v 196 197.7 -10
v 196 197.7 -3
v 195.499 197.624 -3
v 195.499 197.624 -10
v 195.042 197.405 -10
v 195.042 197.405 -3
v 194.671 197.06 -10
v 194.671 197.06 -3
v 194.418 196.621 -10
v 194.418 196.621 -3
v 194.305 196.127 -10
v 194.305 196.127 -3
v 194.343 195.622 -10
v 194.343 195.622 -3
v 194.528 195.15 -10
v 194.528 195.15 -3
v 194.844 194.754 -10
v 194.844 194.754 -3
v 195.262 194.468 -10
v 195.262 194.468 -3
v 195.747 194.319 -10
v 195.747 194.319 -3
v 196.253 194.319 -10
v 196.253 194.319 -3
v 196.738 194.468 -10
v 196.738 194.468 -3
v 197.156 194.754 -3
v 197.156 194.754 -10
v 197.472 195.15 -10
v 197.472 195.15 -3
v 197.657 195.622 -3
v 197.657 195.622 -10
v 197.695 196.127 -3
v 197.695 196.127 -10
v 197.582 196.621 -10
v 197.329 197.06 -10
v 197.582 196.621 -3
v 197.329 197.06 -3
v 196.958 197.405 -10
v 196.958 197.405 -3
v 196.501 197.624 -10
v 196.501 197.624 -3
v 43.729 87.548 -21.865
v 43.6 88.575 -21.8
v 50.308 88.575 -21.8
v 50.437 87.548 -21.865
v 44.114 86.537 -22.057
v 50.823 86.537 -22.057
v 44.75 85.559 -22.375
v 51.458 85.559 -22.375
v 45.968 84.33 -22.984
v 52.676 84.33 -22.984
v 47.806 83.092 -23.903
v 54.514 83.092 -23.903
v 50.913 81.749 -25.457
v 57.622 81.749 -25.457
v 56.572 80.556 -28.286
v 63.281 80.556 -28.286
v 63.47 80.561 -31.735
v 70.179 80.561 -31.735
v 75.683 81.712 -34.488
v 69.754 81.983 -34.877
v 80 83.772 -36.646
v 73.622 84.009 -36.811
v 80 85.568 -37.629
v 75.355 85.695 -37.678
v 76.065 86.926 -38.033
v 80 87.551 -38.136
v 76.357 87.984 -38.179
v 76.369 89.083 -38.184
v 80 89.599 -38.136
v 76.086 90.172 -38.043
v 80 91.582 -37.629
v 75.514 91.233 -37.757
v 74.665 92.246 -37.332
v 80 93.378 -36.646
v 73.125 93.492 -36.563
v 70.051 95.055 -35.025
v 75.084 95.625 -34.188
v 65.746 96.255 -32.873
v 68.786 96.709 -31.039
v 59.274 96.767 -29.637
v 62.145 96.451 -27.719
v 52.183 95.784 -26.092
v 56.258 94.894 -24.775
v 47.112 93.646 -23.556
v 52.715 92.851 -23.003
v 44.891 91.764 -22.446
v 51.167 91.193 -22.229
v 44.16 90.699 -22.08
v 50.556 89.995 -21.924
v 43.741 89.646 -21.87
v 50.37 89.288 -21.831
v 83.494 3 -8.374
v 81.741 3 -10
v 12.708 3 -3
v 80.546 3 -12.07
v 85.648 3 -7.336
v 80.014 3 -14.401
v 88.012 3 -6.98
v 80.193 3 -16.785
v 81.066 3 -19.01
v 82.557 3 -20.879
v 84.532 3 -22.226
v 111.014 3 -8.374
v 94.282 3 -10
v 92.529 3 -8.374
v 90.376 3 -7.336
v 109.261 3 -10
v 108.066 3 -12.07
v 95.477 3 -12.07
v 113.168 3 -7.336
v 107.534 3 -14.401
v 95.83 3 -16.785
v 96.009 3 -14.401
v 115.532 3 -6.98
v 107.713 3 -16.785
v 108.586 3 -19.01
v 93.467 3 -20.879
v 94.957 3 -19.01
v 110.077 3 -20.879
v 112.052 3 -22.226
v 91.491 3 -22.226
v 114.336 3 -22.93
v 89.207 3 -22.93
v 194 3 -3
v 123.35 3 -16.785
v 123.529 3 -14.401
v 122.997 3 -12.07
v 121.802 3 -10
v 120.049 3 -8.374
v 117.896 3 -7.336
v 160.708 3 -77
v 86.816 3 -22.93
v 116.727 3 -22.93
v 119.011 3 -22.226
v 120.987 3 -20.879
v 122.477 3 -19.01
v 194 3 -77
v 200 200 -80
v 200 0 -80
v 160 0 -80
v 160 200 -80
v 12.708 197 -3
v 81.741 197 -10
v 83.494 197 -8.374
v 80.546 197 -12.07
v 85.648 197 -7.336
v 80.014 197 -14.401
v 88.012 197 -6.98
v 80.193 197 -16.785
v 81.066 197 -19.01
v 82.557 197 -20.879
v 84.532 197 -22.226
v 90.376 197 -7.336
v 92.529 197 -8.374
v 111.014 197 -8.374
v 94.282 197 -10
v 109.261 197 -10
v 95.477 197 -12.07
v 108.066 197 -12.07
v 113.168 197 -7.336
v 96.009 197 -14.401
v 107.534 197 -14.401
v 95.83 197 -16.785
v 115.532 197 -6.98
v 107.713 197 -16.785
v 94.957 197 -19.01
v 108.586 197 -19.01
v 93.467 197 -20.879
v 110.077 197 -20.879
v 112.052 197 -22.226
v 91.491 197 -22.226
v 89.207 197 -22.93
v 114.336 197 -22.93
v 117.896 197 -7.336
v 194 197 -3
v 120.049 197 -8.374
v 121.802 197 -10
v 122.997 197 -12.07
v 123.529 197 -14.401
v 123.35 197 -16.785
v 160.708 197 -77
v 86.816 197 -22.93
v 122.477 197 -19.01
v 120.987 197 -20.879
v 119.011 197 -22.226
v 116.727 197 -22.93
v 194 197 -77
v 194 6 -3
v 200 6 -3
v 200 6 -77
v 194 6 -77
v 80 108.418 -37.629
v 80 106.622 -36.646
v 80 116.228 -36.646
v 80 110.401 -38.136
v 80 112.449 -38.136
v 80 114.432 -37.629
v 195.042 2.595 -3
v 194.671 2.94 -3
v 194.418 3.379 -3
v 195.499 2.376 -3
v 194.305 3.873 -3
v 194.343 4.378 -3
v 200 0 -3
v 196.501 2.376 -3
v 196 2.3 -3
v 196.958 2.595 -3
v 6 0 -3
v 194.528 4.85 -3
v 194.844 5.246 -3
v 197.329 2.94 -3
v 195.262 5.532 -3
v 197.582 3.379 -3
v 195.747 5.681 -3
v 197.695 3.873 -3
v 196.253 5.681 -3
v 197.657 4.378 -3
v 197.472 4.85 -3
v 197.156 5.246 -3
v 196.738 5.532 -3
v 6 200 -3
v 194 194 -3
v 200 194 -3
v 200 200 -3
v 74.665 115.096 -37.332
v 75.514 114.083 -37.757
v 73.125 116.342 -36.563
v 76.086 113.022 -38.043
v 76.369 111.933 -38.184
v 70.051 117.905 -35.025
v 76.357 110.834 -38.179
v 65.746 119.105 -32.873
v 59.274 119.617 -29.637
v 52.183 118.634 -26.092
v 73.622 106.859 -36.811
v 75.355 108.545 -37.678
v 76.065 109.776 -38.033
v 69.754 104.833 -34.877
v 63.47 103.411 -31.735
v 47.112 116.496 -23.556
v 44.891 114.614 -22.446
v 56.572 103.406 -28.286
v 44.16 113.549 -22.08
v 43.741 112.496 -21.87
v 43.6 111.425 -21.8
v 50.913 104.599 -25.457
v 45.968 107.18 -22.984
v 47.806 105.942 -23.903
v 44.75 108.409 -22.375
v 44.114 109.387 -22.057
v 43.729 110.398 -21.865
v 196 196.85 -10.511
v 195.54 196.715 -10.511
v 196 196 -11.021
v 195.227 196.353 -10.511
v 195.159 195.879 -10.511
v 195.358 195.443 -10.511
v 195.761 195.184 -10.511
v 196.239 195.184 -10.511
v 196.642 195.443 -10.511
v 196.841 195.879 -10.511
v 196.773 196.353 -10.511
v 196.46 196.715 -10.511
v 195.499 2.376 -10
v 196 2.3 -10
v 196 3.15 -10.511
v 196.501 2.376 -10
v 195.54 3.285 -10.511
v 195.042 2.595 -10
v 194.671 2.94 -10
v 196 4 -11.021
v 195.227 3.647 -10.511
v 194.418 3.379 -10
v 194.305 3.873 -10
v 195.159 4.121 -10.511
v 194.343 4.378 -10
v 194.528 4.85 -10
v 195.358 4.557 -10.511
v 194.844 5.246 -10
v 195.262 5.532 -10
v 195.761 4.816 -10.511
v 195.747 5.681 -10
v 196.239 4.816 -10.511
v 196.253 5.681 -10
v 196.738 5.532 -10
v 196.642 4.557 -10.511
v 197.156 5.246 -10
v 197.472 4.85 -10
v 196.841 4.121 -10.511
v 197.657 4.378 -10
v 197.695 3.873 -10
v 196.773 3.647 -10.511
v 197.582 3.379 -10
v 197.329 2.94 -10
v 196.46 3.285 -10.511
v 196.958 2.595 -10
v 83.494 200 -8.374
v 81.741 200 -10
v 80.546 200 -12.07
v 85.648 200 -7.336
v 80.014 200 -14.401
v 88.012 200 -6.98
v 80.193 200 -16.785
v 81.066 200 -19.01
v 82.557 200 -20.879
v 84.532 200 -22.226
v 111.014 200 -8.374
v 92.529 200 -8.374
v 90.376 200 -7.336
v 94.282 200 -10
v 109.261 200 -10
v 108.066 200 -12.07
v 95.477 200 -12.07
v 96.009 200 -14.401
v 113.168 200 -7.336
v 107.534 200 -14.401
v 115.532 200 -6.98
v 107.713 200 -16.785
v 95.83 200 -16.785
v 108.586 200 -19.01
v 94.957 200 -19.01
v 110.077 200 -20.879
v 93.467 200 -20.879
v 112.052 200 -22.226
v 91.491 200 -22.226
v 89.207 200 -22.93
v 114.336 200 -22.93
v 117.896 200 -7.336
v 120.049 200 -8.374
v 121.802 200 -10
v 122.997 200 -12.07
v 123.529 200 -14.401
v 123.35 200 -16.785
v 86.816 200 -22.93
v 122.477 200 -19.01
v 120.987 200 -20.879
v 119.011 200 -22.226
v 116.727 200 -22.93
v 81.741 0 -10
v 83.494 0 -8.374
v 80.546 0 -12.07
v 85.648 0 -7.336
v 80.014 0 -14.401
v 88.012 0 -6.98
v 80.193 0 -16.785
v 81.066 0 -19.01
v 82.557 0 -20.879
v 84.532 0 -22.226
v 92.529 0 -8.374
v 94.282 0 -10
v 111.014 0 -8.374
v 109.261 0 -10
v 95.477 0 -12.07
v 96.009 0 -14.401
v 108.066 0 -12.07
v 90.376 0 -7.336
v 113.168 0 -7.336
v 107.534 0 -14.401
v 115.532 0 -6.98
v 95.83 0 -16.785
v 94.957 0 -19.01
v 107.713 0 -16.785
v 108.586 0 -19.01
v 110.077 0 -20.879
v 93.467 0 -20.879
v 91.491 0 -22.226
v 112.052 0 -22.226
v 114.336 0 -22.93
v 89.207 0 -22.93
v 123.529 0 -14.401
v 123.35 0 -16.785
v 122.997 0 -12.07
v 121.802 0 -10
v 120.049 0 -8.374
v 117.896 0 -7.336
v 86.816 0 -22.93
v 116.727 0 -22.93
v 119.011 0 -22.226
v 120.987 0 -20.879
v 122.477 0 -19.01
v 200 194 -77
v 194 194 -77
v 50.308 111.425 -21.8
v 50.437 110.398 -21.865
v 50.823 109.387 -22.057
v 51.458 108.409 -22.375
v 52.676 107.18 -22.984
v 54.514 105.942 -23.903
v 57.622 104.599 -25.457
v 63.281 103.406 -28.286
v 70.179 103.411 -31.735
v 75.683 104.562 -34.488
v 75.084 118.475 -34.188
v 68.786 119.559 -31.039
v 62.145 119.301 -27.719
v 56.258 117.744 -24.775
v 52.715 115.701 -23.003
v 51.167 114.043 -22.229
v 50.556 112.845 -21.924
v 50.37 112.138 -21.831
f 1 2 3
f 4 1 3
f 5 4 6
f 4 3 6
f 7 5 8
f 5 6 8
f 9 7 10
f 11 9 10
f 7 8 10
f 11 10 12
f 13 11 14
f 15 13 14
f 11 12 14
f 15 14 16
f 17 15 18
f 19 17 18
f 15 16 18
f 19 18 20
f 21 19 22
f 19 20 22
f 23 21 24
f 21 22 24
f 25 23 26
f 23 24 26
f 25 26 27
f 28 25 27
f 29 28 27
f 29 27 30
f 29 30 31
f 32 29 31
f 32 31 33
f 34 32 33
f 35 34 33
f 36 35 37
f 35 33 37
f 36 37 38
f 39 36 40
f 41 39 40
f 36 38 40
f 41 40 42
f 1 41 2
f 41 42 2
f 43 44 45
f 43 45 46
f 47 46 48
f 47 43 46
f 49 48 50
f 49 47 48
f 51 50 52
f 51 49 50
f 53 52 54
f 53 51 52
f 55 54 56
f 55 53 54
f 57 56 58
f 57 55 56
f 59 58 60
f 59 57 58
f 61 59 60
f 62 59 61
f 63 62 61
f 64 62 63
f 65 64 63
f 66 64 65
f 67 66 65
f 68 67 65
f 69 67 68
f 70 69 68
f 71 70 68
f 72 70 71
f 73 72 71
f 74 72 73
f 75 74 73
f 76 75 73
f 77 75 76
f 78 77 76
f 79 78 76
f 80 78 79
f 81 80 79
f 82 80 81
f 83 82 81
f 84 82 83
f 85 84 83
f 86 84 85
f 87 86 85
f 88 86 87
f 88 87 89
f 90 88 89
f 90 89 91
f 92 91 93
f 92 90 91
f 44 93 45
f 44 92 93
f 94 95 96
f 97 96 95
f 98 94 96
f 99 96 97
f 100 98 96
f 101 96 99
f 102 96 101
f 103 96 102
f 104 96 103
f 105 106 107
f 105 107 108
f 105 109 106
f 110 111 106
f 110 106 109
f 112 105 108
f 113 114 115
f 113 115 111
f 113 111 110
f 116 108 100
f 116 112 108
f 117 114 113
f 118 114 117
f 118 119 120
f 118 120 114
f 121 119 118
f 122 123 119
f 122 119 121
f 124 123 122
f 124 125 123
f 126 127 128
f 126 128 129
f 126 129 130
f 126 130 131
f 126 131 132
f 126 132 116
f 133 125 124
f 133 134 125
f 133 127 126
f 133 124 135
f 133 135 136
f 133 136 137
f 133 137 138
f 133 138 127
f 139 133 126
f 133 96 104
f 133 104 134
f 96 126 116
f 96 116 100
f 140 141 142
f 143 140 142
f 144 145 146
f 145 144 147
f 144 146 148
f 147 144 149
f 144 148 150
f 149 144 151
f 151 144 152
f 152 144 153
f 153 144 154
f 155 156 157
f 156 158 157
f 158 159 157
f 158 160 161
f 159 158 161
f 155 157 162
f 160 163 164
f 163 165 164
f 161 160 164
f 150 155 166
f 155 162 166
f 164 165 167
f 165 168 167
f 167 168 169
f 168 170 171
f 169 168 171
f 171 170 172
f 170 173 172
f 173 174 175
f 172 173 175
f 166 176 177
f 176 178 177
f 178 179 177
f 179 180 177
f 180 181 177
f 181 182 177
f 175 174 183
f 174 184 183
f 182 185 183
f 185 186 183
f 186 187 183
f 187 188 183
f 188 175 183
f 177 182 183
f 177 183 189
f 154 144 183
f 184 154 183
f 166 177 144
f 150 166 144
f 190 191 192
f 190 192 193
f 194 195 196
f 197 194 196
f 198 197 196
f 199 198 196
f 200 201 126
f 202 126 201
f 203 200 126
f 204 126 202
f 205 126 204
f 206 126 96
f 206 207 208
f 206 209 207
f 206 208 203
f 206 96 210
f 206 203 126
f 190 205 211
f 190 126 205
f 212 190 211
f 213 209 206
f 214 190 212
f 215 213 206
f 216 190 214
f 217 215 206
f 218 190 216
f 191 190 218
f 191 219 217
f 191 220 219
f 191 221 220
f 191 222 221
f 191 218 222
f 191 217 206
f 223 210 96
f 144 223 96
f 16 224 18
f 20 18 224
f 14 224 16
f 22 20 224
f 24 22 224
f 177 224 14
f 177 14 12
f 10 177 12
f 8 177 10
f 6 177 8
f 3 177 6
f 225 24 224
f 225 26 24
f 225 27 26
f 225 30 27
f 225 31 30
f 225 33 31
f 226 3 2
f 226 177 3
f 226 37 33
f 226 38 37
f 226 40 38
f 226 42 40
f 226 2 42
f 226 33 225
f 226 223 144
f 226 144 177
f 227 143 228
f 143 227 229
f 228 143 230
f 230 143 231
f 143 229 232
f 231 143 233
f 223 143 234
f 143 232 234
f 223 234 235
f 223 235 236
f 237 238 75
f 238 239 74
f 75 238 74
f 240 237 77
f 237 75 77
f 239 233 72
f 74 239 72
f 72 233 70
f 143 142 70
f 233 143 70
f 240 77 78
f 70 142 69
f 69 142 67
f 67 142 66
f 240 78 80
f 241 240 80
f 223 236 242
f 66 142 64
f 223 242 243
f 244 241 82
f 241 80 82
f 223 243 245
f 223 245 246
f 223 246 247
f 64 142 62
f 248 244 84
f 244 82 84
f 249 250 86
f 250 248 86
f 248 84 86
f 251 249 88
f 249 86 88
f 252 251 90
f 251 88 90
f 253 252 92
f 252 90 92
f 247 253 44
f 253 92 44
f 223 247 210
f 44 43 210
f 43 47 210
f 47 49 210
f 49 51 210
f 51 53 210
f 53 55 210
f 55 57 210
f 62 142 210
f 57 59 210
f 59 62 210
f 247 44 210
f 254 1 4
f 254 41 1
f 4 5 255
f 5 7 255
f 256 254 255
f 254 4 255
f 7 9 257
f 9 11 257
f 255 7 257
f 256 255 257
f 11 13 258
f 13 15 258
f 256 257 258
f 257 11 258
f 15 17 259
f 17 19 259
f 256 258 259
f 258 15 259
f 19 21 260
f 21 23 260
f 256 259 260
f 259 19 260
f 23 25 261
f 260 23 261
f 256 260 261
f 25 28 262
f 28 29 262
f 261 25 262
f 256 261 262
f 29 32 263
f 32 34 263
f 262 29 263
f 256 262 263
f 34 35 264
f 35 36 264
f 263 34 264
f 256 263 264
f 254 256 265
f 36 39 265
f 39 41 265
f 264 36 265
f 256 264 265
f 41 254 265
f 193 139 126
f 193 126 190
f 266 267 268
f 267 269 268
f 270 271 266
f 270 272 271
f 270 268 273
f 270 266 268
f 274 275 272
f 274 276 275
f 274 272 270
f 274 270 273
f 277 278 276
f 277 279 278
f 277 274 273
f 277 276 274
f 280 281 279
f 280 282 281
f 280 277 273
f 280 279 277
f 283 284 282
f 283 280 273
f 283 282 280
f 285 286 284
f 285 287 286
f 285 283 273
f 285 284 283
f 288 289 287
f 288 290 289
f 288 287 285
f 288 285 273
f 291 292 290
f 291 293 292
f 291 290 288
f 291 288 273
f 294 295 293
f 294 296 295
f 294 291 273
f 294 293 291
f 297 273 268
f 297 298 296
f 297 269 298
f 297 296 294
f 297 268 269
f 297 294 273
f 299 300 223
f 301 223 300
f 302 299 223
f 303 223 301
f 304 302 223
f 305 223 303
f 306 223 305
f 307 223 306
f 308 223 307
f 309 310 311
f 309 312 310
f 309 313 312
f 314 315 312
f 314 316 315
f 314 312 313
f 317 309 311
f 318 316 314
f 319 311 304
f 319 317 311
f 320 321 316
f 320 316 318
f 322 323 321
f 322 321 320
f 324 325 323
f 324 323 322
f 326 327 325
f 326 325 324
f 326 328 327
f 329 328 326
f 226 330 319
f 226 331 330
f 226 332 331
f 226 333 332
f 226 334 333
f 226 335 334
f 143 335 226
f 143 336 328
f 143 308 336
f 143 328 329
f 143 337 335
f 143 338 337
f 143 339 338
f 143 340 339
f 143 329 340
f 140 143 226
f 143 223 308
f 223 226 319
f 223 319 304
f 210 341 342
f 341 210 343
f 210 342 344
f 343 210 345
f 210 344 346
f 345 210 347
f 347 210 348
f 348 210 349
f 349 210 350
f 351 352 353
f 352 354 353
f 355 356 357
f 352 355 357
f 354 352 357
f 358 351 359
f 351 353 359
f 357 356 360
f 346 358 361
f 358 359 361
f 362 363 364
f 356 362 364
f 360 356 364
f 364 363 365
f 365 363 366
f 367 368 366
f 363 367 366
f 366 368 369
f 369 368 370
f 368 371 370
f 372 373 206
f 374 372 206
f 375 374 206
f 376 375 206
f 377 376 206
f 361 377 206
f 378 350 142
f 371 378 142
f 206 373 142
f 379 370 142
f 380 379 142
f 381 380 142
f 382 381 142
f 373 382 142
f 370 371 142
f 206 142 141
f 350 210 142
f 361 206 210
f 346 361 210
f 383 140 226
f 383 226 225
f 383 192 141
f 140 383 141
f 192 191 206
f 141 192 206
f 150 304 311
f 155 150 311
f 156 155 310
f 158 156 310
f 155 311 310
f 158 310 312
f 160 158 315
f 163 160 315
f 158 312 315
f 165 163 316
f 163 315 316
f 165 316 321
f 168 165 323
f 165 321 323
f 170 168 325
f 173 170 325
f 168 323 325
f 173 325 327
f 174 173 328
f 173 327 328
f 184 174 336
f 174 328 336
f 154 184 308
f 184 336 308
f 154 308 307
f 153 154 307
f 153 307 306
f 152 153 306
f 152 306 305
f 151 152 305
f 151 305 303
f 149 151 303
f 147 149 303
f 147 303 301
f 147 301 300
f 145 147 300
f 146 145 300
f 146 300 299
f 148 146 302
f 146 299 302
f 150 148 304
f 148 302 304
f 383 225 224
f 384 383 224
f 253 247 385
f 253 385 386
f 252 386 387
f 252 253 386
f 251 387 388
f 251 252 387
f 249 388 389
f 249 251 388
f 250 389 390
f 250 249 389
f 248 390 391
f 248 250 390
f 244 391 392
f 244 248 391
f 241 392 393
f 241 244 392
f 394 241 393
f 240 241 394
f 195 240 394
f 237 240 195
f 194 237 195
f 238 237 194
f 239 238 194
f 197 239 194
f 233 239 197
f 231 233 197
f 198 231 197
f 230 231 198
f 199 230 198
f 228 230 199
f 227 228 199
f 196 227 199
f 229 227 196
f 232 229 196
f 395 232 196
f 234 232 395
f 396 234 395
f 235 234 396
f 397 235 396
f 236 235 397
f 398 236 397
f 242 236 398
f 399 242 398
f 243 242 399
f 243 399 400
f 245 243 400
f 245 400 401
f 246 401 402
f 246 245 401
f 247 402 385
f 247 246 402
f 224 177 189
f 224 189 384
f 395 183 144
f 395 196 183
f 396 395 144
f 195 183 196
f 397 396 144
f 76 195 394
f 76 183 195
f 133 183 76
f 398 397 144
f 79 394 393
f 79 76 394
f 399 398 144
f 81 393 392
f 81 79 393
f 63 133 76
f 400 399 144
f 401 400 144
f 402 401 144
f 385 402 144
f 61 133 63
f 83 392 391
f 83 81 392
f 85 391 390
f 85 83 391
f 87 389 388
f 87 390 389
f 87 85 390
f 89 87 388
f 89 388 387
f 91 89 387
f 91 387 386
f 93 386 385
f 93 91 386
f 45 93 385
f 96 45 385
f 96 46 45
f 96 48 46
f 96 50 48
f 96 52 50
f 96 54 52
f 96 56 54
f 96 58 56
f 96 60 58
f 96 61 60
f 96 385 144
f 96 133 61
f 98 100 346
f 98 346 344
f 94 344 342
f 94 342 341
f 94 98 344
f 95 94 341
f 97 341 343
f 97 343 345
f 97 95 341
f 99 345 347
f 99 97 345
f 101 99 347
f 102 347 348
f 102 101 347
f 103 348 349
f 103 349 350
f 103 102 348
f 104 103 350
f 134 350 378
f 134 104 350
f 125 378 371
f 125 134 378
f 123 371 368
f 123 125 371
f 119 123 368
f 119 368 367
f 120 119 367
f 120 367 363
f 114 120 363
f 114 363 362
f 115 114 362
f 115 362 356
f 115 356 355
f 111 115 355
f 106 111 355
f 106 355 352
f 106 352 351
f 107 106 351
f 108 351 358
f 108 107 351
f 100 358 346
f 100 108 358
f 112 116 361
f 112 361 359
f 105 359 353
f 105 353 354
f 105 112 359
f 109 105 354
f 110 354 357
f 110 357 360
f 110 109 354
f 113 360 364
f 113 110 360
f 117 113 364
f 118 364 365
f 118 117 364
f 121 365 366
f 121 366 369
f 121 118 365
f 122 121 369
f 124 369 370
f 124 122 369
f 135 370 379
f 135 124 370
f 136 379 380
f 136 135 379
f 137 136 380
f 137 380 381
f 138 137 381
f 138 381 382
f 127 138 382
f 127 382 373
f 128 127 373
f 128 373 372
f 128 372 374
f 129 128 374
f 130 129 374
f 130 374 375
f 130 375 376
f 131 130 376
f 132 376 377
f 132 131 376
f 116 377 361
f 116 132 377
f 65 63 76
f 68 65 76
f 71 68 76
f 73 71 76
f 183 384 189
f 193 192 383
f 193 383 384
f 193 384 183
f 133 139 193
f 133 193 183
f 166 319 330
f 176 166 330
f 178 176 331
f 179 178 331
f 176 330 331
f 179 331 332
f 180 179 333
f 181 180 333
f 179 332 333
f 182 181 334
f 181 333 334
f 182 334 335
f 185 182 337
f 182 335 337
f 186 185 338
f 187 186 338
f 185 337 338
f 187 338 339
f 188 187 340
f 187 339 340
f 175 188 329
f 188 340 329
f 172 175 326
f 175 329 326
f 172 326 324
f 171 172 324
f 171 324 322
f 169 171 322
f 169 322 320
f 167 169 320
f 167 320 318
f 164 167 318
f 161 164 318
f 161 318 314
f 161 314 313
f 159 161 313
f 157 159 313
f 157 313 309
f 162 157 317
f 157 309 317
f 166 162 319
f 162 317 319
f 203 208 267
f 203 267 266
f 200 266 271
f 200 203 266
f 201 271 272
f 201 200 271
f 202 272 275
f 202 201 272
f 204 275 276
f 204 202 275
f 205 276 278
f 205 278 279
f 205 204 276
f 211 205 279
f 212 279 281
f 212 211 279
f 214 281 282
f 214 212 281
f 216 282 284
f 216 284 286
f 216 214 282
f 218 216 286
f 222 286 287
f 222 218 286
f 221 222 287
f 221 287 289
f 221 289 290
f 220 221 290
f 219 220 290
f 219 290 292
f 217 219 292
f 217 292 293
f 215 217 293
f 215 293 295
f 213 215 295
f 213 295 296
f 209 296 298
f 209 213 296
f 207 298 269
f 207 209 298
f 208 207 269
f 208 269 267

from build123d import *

# Parameters (mm, degrees)
SALIENTE_EXTRUIR2_DEPTH = 200
VACIADO2_T              = -3
CROQUIS6_R              = 8.2
CORTAR_EXTRUIR4_DEPTH   = 80
CROQUIS2_R              = 8.02
CORTAR_EXTRUIR5_DEPTH   = 3
CORTAR_EXTRUIR6_START   = -3
CROQUIS5_R              = 8.02
CORTAR_EXTRUIR6_DEPTH   = 3
CROQUIS7_W              = 7.4
CROQUIS7_H              = 7.4
CORTAR_EXTRUIR11_DEPTH  = 3
CROQUIS8_W              = 7.04
CROQUIS8_H              = 7.04
CORTAR_EXTRUIR12_DEPTH  = 3
CROQUIS9_W              = 35
CROQUIS9_H              = 35
CORTAR_EXTRUIR13_DEPTH  = 3
CROQUIS15_W             = 6
CROQUIS15_H             = 3
SALIENTE_EXTRUIR3_DEPTH = 75


with BuildPart() as part:
    # Croquis1 → Saliente-Extruir2 (new body)
    with BuildSketch(Plane(origin=(0, 0, 0), x_dir=(1, 0, 0), z_dir=(0, 1, 0))):
        Polygon((0, 0), (200, 0), (200, 80), (160, 80), align=None)
    extrude(amount=SALIENTE_EXTRUIR2_DEPTH)

    # Vaciado2
    vaciado2_openings = [part.faces().sort_by_distance(p)[0] for p in [
        (200, 100, -40),
    ]]
    offset(amount=VACIADO2_T, openings=vaciado2_openings, kind=Kind.INTERSECTION)

    # Croquis6 → Cortar-Extruir4 (cut)
    with BuildSketch(Plane(origin=(0, 0, 0), x_dir=(0, 0, -1), z_dir=(1, 0, 0))):
        with Locations(Location((30, 88.575, 0), (0, 0, 180))):
            Circle(CROQUIS6_R)
        with Locations(Location((30, 111.425, 0), (0, 0, 180))):
            Circle(CROQUIS6_R)
    extrude(amount=CORTAR_EXTRUIR4_DEPTH, mode=Mode.SUBTRACT)

    # Croquis2 → Cortar-Extruir5 (cut)
    with BuildSketch(Plane(origin=(0, 200, 0), x_dir=(1, 0, 0), z_dir=(0, 1, 0))):
        with Locations(Location((88.011571484, 15, 0), (0, 0, 270))):
            Circle(CROQUIS2_R)
        with Locations(Location((115.531571484, 15, 0), (0, 0, 270))):
            Circle(CROQUIS2_R)
    extrude(amount=-CORTAR_EXTRUIR5_DEPTH, mode=Mode.SUBTRACT)

    # Croquis5 → Cortar-Extruir6 (cut)
    with BuildSketch(Plane.XZ.offset(CORTAR_EXTRUIR6_START)):
        with Locations(Location((88.011571484, -15, 0), (0, 0, 90))):
            Circle(CROQUIS5_R)
        with Locations(Location((115.531571484, -15, 0), (0, 0, 90))):
            Circle(CROQUIS5_R)
    extrude(amount=CORTAR_EXTRUIR6_DEPTH, mode=Mode.SUBTRACT)

    # Croquis7 → Cortar-Extruir11 (cut)
    with BuildSketch(Plane.XY):
        with Locations((18.7, 13.7)):
            Rectangle(CROQUIS7_W, CROQUIS7_H)
    cortar_extruir11 = extrude(amount=-CORTAR_EXTRUIR11_DEPTH, mode=Mode.SUBTRACT)

    # Simetría5: Cortar-Extruir11 across plane
    add(cortar_extruir11.mirror(Plane.ZX.offset(100)), mode=Mode.SUBTRACT)

    # Croquis8 → Cortar-Extruir12 (cut)
    with BuildSketch(Plane.XY):
        with Locations((18.52, 100)):
            Rectangle(CROQUIS8_W, CROQUIS8_H)
    extrude(amount=-CORTAR_EXTRUIR12_DEPTH, mode=Mode.SUBTRACT)

    # Croquis9 → Cortar-Extruir13 (cut)
    with BuildSketch(Plane.XY):
        with Locations((174.5, 174.5)):
            Rectangle(CROQUIS9_W, CROQUIS9_H)
    cortar_extruir13 = extrude(amount=-CORTAR_EXTRUIR13_DEPTH, mode=Mode.SUBTRACT)

    # Simetría6: Cortar-Extruir13 across plane
    add(cortar_extruir13.mirror(Plane.ZX.offset(100)), mode=Mode.SUBTRACT)

    # Croquis15 → Saliente-Extruir3 (add)
    with BuildSketch(Plane(origin=(0, 0, -3), x_dir=(-1, 0, 0), z_dir=(0, 0, -1))):
        with Locations((-197, 4.5)):
            Rectangle(CROQUIS15_W, CROQUIS15_H)
    saliente_extruir3 = extrude(amount=SALIENTE_EXTRUIR3_DEPTH)

    # Simetría7: Saliente-Extruir3 across plane
    add(saliente_extruir3.mirror(Plane.ZX.offset(100)))

    # Croquis18 → Refrentado para tornillo tapón con cabeza plana de clavija de M33 (revolve, cut)
    with BuildSketch(Plane(origin=(196, 4, 0), x_dir=(0, -1, 0), z_dir=(1, 0, 0))):
        Polygon((0, 0), (0, 11.021463052), (1.7, 10), (1.7, 1.66), (3.36, 0), align=None)
    refrentado_para_tornillo_tap_n_con_cabez = revolve(axis=Axis((196, 4, 6.35), (0, 0, -1)), mode=Mode.SUBTRACT)

    # Simetría8: Refrentado para tornillo tapón con cabeza plana de clavija de M33 across plane
    add(refrentado_para_tornillo_tap_n_con_cabez.mirror(Plane.ZX.offset(100)), mode=Mode.SUBTRACT)

    # Simetría9: Refrentado para tornillo tapón con cabeza plana de clavija de M33 across plane
    add(refrentado_para_tornillo_tap_n_con_cabez.mirror(Plane(origin=(100, 0, 0), x_dir=(0, 0, 1), z_dir=(1, 0, 0))), mode=Mode.SUBTRACT)

    # Simetría9 copy 1 sketch → Simetría9 copy 1 (revolve, cut)
    with BuildSketch(Plane(origin=(4, 196, 0), x_dir=(0, 1, 0), z_dir=(-1, 0, 0))):
        Polygon((0, 0), (0, 11.021463052), (1.7, 10), (1.7, 1.66), (3.36, 0), align=None)
    revolve(axis=Axis((4, 196, 6.35), (0, 0, -1)), mode=Mode.SUBTRACT)

    # Partir1
    split(bisect_by=Plane.XY.offset(-3), keep=Keep.BOTTOM)


solid = part.part
